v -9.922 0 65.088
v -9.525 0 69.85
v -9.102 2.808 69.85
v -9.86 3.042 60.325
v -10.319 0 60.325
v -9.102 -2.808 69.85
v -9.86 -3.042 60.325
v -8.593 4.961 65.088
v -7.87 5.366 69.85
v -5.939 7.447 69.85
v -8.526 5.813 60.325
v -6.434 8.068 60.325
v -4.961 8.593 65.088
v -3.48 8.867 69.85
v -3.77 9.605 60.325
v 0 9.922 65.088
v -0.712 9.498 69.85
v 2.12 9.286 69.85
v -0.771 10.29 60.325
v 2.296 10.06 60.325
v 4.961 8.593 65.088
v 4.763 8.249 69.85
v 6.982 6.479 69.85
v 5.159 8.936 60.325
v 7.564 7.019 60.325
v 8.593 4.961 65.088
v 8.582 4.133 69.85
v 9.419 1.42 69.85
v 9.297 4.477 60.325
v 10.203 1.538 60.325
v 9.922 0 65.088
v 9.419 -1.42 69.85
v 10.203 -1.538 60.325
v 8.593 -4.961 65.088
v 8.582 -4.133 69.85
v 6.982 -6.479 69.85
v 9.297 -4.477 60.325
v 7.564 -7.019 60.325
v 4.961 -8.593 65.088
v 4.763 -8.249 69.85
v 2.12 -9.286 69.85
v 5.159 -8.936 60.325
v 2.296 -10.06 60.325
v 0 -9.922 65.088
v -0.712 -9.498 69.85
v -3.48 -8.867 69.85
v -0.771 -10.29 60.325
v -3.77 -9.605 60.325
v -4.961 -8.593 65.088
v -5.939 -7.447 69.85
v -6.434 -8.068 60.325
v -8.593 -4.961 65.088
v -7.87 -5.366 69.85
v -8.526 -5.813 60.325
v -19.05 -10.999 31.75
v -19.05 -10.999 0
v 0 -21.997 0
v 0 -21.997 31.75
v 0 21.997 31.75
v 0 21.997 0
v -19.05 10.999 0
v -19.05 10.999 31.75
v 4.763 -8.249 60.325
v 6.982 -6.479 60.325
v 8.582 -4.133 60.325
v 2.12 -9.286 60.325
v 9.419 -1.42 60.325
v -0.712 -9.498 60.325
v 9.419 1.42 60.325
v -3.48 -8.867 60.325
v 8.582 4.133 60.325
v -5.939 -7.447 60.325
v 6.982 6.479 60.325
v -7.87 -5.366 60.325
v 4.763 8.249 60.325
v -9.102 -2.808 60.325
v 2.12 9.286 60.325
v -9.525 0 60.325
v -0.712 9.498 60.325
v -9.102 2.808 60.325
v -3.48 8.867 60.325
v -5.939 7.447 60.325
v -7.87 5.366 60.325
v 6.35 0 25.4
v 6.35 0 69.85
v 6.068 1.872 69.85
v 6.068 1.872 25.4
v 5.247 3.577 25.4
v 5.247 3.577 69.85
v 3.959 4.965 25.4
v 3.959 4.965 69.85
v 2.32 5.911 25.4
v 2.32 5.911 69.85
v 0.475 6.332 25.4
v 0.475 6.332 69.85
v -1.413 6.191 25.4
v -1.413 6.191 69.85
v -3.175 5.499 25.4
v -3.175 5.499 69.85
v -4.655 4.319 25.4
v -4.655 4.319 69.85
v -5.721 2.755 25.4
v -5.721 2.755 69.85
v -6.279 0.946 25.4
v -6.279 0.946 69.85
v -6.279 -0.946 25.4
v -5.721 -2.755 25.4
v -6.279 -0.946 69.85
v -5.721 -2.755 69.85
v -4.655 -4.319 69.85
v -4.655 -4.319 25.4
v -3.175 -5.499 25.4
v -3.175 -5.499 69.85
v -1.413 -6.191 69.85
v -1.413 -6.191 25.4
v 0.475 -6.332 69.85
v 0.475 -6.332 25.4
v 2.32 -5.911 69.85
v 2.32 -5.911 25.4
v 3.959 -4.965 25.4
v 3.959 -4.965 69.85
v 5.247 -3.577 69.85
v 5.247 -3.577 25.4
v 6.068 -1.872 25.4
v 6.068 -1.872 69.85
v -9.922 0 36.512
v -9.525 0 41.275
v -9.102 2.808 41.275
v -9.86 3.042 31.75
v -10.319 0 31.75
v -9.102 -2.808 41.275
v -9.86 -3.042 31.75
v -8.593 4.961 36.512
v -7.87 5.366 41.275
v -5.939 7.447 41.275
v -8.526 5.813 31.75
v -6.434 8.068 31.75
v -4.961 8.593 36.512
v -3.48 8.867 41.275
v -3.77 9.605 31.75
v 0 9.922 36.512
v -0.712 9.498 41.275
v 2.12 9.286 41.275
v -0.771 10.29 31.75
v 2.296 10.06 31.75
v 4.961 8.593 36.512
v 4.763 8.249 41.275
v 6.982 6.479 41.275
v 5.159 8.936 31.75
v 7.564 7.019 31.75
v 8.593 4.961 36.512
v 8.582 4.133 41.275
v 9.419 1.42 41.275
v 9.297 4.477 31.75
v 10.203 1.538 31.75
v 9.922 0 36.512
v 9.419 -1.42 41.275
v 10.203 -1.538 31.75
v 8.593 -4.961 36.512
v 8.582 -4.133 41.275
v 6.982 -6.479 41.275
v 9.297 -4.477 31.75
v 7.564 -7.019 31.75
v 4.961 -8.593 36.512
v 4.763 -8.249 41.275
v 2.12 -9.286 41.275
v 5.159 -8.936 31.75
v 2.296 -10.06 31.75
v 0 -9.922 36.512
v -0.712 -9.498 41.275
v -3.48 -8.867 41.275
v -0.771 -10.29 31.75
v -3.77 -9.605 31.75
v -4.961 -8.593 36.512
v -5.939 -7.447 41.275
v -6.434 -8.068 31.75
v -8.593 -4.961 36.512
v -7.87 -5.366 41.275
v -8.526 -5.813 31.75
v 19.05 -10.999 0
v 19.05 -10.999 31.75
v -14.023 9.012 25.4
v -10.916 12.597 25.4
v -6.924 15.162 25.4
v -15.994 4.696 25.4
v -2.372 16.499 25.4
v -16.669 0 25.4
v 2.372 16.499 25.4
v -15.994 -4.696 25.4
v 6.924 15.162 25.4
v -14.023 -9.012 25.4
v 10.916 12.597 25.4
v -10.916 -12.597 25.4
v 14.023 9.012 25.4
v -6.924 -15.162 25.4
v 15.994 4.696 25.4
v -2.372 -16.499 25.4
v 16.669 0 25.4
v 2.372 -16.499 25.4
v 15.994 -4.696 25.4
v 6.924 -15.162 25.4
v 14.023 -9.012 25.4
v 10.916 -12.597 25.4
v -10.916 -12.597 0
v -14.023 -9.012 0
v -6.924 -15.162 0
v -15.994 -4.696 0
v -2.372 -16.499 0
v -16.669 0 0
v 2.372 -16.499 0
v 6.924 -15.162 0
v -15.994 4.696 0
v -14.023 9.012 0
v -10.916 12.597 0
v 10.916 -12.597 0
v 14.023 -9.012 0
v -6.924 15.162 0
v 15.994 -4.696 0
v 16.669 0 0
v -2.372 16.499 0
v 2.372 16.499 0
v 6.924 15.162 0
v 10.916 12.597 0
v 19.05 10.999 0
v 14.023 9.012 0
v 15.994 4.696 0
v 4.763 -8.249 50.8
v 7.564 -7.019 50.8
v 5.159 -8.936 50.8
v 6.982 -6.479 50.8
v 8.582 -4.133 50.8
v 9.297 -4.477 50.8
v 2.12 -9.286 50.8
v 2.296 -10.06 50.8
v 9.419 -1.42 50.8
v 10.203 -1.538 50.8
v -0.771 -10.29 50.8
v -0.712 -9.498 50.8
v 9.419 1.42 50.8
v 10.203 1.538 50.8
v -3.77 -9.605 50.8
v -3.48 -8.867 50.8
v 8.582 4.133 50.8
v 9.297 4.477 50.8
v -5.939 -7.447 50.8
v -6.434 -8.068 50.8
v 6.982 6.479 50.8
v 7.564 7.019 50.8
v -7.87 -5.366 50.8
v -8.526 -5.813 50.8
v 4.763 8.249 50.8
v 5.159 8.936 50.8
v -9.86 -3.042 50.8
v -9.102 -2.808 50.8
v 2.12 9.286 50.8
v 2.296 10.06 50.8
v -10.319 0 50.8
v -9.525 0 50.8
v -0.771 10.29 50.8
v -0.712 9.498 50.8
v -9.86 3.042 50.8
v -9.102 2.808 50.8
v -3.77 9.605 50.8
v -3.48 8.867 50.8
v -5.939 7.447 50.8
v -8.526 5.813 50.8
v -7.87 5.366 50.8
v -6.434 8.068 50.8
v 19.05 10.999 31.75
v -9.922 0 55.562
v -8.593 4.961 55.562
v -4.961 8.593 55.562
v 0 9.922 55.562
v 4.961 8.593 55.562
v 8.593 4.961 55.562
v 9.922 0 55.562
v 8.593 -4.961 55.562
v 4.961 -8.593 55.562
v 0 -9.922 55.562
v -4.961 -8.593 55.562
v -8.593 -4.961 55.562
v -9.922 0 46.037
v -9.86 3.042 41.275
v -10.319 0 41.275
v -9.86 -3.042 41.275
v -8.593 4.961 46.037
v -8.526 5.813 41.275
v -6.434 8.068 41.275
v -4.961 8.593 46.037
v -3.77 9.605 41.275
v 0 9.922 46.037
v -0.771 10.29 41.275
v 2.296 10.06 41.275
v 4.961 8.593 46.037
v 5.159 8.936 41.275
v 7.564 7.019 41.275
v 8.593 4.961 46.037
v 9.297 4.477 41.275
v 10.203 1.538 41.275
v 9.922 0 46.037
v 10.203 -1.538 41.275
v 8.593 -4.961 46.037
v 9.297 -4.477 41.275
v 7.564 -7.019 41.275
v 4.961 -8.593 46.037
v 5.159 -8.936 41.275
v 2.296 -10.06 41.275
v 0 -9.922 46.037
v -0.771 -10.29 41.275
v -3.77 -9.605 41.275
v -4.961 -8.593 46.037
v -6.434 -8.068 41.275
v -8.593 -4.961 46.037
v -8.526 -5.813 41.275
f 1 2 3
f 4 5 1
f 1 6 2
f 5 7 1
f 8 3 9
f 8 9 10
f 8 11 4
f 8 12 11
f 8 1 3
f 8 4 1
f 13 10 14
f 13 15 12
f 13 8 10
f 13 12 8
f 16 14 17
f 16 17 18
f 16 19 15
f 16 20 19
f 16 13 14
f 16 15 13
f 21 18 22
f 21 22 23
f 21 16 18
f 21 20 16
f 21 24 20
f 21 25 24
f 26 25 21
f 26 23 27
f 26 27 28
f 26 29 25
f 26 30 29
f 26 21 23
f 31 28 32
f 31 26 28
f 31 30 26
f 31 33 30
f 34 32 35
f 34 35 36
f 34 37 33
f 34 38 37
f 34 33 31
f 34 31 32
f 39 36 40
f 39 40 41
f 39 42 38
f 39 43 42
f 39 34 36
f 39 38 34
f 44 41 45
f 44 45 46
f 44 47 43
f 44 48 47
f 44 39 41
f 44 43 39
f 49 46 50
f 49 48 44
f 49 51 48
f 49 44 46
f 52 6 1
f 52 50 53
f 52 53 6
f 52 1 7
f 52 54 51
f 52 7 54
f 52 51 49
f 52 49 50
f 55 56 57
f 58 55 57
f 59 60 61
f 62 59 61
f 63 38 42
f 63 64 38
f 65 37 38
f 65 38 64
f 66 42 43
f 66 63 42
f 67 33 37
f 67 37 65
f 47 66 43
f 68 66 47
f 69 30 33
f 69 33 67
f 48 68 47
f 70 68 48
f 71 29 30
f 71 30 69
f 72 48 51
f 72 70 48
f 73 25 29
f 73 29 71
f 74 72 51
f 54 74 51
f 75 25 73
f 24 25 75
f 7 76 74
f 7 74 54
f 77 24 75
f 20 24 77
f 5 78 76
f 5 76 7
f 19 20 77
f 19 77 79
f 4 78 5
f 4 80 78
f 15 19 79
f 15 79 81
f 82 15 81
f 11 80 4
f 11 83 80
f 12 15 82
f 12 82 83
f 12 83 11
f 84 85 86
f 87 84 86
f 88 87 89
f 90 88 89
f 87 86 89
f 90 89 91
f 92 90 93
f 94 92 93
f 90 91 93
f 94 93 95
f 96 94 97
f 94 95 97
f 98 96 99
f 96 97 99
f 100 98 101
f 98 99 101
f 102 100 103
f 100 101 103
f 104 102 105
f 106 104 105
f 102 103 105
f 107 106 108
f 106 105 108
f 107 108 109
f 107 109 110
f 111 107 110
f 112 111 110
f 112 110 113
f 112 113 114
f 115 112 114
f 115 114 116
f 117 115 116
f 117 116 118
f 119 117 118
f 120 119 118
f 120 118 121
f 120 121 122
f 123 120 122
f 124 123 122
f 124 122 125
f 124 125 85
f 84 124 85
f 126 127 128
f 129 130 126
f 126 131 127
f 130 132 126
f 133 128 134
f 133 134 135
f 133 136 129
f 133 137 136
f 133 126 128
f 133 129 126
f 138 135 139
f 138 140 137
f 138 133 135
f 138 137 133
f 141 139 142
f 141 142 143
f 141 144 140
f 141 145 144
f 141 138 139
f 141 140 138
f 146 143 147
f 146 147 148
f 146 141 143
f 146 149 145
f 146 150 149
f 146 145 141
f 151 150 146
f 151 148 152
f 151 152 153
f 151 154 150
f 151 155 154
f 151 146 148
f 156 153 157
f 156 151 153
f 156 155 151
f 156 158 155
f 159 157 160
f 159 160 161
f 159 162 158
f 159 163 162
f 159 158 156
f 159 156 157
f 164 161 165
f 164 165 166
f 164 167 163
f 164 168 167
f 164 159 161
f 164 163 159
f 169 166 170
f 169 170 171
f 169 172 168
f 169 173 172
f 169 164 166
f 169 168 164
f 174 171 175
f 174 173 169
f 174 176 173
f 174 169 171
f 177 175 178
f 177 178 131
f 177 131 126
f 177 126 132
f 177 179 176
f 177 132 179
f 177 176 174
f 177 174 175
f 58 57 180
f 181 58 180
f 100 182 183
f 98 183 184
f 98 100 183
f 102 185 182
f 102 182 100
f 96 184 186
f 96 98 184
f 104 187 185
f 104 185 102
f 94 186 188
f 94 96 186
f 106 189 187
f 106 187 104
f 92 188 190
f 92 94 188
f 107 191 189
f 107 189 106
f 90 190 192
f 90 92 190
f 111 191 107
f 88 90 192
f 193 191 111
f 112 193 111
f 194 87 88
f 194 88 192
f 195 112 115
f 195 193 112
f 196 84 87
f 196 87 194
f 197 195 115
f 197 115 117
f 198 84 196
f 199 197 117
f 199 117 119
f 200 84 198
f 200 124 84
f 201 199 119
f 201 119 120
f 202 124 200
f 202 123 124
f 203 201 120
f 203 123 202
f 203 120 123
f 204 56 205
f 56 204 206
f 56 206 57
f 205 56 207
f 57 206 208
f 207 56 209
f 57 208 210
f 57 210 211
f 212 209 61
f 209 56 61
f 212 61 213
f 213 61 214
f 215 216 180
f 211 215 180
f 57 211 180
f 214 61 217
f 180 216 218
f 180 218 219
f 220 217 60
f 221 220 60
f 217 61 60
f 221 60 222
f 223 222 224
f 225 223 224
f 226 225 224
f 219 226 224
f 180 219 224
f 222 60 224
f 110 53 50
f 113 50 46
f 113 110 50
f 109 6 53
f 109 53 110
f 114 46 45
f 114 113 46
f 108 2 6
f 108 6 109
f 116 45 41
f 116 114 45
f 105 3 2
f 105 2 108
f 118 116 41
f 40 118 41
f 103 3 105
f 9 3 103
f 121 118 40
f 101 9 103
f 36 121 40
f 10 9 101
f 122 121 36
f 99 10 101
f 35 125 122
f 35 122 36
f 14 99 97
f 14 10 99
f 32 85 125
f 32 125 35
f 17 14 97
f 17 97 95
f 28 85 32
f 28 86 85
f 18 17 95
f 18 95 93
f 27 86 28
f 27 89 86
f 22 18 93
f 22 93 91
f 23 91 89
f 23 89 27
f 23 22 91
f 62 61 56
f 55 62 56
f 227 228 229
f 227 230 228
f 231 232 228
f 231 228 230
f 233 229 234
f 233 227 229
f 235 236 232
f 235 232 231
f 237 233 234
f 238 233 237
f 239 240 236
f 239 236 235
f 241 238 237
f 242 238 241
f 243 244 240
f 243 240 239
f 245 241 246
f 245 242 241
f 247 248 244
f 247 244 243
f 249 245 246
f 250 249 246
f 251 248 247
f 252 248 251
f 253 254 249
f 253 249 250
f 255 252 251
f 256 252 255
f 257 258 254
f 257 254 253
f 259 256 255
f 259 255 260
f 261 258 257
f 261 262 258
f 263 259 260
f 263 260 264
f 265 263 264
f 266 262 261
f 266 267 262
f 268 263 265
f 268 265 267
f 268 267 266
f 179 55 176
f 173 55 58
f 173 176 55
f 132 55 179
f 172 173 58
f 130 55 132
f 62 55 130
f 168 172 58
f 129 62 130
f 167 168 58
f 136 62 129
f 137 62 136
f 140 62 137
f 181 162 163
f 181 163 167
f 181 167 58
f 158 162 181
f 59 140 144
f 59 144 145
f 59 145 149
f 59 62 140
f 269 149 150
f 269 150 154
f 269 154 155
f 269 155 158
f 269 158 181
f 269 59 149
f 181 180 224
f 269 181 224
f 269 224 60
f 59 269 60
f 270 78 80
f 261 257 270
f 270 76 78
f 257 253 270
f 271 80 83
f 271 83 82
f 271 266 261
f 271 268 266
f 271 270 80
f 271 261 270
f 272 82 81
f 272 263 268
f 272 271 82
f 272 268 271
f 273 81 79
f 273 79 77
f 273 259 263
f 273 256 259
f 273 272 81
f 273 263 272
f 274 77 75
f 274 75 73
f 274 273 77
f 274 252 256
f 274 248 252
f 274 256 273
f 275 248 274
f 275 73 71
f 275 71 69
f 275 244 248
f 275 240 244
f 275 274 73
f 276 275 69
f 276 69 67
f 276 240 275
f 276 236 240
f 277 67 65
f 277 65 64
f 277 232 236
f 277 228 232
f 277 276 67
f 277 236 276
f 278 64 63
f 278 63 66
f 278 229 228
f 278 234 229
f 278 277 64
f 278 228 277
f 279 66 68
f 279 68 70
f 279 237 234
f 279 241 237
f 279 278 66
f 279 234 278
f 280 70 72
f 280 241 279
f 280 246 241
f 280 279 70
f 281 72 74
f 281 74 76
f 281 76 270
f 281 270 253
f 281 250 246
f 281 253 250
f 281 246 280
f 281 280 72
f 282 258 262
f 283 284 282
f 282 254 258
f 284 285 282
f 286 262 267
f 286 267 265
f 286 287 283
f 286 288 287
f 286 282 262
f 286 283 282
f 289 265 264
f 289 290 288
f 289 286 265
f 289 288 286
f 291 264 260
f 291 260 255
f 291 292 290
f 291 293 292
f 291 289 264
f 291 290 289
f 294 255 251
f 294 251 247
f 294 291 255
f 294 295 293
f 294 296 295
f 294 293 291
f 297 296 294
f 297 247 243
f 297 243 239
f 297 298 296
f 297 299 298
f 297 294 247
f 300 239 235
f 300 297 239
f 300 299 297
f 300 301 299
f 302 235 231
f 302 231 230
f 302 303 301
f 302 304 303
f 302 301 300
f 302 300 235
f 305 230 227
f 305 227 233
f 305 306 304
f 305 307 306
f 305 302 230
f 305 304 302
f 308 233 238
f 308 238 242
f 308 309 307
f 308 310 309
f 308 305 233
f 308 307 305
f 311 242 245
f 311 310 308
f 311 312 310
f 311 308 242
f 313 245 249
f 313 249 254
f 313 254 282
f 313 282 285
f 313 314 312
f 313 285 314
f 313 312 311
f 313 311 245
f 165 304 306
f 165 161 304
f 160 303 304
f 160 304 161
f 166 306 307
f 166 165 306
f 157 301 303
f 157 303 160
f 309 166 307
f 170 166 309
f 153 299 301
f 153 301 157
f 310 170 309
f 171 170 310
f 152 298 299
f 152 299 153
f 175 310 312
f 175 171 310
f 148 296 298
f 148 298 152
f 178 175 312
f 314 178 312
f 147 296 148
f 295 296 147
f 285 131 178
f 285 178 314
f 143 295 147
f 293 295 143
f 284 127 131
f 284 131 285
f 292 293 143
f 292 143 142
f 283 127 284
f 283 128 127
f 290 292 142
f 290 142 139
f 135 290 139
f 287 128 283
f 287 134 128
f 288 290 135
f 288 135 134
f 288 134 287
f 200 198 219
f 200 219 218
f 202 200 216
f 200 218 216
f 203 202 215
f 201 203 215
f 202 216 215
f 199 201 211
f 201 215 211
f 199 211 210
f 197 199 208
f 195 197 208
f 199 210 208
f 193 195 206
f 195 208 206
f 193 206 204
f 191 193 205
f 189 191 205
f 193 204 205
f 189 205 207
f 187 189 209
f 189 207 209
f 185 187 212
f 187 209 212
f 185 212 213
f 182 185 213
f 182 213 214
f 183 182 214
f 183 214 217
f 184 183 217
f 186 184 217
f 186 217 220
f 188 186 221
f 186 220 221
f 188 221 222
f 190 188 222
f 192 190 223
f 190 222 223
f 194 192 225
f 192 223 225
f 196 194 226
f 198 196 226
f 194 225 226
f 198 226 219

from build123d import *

# Parameters (mm, degrees)
F1_DEPTH = 31.75
F4_R     = 6.35
F5_DEPTH = 101.6
F6_R     = 16.66875
F7_DEPTH = 25.4


with BuildPart() as f1:
    # F0 (on Top) → F1 (new body)
    with BuildSketch(Plane.XY):
        Polygon((19.05, 10.998523), (0, 21.997045), (-19.05, 10.998523), (-19.05, -10.998523), (0, -21.997045), (19.05, -10.998523), align=None)
    extrude(amount=F1_DEPTH)

    # F2 (on Front) → F3 (revolve)
    with BuildSketch(Plane.XZ):
        Polygon((0, 31.75), (0, 69.85), (-9.525, 69.85), (-10.31875, 60.325), (-9.525, 60.325), (-10.31875, 50.8), (-9.525, 50.8), (-10.31875, 41.275), (-9.525, 41.275), (-10.31875, 31.75), align=None)
    revolve(axis=Axis((0, 0, 50.8), (0, 0, -1)))

    # F4 (on face) → F5 (cut)
    with BuildSketch(Plane.XY.offset(69.85)):
        Circle(F4_R)
    extrude(amount=-F5_DEPTH, mode=Mode.SUBTRACT)

    # F6 (on face) → F7 (cut)
    with BuildSketch(Plane(origin=(0, 0, 0), x_dir=(1, 0, 0), z_dir=(0, 0, -1))):
        Circle(F6_R)
    extrude(amount=-F7_DEPTH, mode=Mode.SUBTRACT)


solid = f1.part
